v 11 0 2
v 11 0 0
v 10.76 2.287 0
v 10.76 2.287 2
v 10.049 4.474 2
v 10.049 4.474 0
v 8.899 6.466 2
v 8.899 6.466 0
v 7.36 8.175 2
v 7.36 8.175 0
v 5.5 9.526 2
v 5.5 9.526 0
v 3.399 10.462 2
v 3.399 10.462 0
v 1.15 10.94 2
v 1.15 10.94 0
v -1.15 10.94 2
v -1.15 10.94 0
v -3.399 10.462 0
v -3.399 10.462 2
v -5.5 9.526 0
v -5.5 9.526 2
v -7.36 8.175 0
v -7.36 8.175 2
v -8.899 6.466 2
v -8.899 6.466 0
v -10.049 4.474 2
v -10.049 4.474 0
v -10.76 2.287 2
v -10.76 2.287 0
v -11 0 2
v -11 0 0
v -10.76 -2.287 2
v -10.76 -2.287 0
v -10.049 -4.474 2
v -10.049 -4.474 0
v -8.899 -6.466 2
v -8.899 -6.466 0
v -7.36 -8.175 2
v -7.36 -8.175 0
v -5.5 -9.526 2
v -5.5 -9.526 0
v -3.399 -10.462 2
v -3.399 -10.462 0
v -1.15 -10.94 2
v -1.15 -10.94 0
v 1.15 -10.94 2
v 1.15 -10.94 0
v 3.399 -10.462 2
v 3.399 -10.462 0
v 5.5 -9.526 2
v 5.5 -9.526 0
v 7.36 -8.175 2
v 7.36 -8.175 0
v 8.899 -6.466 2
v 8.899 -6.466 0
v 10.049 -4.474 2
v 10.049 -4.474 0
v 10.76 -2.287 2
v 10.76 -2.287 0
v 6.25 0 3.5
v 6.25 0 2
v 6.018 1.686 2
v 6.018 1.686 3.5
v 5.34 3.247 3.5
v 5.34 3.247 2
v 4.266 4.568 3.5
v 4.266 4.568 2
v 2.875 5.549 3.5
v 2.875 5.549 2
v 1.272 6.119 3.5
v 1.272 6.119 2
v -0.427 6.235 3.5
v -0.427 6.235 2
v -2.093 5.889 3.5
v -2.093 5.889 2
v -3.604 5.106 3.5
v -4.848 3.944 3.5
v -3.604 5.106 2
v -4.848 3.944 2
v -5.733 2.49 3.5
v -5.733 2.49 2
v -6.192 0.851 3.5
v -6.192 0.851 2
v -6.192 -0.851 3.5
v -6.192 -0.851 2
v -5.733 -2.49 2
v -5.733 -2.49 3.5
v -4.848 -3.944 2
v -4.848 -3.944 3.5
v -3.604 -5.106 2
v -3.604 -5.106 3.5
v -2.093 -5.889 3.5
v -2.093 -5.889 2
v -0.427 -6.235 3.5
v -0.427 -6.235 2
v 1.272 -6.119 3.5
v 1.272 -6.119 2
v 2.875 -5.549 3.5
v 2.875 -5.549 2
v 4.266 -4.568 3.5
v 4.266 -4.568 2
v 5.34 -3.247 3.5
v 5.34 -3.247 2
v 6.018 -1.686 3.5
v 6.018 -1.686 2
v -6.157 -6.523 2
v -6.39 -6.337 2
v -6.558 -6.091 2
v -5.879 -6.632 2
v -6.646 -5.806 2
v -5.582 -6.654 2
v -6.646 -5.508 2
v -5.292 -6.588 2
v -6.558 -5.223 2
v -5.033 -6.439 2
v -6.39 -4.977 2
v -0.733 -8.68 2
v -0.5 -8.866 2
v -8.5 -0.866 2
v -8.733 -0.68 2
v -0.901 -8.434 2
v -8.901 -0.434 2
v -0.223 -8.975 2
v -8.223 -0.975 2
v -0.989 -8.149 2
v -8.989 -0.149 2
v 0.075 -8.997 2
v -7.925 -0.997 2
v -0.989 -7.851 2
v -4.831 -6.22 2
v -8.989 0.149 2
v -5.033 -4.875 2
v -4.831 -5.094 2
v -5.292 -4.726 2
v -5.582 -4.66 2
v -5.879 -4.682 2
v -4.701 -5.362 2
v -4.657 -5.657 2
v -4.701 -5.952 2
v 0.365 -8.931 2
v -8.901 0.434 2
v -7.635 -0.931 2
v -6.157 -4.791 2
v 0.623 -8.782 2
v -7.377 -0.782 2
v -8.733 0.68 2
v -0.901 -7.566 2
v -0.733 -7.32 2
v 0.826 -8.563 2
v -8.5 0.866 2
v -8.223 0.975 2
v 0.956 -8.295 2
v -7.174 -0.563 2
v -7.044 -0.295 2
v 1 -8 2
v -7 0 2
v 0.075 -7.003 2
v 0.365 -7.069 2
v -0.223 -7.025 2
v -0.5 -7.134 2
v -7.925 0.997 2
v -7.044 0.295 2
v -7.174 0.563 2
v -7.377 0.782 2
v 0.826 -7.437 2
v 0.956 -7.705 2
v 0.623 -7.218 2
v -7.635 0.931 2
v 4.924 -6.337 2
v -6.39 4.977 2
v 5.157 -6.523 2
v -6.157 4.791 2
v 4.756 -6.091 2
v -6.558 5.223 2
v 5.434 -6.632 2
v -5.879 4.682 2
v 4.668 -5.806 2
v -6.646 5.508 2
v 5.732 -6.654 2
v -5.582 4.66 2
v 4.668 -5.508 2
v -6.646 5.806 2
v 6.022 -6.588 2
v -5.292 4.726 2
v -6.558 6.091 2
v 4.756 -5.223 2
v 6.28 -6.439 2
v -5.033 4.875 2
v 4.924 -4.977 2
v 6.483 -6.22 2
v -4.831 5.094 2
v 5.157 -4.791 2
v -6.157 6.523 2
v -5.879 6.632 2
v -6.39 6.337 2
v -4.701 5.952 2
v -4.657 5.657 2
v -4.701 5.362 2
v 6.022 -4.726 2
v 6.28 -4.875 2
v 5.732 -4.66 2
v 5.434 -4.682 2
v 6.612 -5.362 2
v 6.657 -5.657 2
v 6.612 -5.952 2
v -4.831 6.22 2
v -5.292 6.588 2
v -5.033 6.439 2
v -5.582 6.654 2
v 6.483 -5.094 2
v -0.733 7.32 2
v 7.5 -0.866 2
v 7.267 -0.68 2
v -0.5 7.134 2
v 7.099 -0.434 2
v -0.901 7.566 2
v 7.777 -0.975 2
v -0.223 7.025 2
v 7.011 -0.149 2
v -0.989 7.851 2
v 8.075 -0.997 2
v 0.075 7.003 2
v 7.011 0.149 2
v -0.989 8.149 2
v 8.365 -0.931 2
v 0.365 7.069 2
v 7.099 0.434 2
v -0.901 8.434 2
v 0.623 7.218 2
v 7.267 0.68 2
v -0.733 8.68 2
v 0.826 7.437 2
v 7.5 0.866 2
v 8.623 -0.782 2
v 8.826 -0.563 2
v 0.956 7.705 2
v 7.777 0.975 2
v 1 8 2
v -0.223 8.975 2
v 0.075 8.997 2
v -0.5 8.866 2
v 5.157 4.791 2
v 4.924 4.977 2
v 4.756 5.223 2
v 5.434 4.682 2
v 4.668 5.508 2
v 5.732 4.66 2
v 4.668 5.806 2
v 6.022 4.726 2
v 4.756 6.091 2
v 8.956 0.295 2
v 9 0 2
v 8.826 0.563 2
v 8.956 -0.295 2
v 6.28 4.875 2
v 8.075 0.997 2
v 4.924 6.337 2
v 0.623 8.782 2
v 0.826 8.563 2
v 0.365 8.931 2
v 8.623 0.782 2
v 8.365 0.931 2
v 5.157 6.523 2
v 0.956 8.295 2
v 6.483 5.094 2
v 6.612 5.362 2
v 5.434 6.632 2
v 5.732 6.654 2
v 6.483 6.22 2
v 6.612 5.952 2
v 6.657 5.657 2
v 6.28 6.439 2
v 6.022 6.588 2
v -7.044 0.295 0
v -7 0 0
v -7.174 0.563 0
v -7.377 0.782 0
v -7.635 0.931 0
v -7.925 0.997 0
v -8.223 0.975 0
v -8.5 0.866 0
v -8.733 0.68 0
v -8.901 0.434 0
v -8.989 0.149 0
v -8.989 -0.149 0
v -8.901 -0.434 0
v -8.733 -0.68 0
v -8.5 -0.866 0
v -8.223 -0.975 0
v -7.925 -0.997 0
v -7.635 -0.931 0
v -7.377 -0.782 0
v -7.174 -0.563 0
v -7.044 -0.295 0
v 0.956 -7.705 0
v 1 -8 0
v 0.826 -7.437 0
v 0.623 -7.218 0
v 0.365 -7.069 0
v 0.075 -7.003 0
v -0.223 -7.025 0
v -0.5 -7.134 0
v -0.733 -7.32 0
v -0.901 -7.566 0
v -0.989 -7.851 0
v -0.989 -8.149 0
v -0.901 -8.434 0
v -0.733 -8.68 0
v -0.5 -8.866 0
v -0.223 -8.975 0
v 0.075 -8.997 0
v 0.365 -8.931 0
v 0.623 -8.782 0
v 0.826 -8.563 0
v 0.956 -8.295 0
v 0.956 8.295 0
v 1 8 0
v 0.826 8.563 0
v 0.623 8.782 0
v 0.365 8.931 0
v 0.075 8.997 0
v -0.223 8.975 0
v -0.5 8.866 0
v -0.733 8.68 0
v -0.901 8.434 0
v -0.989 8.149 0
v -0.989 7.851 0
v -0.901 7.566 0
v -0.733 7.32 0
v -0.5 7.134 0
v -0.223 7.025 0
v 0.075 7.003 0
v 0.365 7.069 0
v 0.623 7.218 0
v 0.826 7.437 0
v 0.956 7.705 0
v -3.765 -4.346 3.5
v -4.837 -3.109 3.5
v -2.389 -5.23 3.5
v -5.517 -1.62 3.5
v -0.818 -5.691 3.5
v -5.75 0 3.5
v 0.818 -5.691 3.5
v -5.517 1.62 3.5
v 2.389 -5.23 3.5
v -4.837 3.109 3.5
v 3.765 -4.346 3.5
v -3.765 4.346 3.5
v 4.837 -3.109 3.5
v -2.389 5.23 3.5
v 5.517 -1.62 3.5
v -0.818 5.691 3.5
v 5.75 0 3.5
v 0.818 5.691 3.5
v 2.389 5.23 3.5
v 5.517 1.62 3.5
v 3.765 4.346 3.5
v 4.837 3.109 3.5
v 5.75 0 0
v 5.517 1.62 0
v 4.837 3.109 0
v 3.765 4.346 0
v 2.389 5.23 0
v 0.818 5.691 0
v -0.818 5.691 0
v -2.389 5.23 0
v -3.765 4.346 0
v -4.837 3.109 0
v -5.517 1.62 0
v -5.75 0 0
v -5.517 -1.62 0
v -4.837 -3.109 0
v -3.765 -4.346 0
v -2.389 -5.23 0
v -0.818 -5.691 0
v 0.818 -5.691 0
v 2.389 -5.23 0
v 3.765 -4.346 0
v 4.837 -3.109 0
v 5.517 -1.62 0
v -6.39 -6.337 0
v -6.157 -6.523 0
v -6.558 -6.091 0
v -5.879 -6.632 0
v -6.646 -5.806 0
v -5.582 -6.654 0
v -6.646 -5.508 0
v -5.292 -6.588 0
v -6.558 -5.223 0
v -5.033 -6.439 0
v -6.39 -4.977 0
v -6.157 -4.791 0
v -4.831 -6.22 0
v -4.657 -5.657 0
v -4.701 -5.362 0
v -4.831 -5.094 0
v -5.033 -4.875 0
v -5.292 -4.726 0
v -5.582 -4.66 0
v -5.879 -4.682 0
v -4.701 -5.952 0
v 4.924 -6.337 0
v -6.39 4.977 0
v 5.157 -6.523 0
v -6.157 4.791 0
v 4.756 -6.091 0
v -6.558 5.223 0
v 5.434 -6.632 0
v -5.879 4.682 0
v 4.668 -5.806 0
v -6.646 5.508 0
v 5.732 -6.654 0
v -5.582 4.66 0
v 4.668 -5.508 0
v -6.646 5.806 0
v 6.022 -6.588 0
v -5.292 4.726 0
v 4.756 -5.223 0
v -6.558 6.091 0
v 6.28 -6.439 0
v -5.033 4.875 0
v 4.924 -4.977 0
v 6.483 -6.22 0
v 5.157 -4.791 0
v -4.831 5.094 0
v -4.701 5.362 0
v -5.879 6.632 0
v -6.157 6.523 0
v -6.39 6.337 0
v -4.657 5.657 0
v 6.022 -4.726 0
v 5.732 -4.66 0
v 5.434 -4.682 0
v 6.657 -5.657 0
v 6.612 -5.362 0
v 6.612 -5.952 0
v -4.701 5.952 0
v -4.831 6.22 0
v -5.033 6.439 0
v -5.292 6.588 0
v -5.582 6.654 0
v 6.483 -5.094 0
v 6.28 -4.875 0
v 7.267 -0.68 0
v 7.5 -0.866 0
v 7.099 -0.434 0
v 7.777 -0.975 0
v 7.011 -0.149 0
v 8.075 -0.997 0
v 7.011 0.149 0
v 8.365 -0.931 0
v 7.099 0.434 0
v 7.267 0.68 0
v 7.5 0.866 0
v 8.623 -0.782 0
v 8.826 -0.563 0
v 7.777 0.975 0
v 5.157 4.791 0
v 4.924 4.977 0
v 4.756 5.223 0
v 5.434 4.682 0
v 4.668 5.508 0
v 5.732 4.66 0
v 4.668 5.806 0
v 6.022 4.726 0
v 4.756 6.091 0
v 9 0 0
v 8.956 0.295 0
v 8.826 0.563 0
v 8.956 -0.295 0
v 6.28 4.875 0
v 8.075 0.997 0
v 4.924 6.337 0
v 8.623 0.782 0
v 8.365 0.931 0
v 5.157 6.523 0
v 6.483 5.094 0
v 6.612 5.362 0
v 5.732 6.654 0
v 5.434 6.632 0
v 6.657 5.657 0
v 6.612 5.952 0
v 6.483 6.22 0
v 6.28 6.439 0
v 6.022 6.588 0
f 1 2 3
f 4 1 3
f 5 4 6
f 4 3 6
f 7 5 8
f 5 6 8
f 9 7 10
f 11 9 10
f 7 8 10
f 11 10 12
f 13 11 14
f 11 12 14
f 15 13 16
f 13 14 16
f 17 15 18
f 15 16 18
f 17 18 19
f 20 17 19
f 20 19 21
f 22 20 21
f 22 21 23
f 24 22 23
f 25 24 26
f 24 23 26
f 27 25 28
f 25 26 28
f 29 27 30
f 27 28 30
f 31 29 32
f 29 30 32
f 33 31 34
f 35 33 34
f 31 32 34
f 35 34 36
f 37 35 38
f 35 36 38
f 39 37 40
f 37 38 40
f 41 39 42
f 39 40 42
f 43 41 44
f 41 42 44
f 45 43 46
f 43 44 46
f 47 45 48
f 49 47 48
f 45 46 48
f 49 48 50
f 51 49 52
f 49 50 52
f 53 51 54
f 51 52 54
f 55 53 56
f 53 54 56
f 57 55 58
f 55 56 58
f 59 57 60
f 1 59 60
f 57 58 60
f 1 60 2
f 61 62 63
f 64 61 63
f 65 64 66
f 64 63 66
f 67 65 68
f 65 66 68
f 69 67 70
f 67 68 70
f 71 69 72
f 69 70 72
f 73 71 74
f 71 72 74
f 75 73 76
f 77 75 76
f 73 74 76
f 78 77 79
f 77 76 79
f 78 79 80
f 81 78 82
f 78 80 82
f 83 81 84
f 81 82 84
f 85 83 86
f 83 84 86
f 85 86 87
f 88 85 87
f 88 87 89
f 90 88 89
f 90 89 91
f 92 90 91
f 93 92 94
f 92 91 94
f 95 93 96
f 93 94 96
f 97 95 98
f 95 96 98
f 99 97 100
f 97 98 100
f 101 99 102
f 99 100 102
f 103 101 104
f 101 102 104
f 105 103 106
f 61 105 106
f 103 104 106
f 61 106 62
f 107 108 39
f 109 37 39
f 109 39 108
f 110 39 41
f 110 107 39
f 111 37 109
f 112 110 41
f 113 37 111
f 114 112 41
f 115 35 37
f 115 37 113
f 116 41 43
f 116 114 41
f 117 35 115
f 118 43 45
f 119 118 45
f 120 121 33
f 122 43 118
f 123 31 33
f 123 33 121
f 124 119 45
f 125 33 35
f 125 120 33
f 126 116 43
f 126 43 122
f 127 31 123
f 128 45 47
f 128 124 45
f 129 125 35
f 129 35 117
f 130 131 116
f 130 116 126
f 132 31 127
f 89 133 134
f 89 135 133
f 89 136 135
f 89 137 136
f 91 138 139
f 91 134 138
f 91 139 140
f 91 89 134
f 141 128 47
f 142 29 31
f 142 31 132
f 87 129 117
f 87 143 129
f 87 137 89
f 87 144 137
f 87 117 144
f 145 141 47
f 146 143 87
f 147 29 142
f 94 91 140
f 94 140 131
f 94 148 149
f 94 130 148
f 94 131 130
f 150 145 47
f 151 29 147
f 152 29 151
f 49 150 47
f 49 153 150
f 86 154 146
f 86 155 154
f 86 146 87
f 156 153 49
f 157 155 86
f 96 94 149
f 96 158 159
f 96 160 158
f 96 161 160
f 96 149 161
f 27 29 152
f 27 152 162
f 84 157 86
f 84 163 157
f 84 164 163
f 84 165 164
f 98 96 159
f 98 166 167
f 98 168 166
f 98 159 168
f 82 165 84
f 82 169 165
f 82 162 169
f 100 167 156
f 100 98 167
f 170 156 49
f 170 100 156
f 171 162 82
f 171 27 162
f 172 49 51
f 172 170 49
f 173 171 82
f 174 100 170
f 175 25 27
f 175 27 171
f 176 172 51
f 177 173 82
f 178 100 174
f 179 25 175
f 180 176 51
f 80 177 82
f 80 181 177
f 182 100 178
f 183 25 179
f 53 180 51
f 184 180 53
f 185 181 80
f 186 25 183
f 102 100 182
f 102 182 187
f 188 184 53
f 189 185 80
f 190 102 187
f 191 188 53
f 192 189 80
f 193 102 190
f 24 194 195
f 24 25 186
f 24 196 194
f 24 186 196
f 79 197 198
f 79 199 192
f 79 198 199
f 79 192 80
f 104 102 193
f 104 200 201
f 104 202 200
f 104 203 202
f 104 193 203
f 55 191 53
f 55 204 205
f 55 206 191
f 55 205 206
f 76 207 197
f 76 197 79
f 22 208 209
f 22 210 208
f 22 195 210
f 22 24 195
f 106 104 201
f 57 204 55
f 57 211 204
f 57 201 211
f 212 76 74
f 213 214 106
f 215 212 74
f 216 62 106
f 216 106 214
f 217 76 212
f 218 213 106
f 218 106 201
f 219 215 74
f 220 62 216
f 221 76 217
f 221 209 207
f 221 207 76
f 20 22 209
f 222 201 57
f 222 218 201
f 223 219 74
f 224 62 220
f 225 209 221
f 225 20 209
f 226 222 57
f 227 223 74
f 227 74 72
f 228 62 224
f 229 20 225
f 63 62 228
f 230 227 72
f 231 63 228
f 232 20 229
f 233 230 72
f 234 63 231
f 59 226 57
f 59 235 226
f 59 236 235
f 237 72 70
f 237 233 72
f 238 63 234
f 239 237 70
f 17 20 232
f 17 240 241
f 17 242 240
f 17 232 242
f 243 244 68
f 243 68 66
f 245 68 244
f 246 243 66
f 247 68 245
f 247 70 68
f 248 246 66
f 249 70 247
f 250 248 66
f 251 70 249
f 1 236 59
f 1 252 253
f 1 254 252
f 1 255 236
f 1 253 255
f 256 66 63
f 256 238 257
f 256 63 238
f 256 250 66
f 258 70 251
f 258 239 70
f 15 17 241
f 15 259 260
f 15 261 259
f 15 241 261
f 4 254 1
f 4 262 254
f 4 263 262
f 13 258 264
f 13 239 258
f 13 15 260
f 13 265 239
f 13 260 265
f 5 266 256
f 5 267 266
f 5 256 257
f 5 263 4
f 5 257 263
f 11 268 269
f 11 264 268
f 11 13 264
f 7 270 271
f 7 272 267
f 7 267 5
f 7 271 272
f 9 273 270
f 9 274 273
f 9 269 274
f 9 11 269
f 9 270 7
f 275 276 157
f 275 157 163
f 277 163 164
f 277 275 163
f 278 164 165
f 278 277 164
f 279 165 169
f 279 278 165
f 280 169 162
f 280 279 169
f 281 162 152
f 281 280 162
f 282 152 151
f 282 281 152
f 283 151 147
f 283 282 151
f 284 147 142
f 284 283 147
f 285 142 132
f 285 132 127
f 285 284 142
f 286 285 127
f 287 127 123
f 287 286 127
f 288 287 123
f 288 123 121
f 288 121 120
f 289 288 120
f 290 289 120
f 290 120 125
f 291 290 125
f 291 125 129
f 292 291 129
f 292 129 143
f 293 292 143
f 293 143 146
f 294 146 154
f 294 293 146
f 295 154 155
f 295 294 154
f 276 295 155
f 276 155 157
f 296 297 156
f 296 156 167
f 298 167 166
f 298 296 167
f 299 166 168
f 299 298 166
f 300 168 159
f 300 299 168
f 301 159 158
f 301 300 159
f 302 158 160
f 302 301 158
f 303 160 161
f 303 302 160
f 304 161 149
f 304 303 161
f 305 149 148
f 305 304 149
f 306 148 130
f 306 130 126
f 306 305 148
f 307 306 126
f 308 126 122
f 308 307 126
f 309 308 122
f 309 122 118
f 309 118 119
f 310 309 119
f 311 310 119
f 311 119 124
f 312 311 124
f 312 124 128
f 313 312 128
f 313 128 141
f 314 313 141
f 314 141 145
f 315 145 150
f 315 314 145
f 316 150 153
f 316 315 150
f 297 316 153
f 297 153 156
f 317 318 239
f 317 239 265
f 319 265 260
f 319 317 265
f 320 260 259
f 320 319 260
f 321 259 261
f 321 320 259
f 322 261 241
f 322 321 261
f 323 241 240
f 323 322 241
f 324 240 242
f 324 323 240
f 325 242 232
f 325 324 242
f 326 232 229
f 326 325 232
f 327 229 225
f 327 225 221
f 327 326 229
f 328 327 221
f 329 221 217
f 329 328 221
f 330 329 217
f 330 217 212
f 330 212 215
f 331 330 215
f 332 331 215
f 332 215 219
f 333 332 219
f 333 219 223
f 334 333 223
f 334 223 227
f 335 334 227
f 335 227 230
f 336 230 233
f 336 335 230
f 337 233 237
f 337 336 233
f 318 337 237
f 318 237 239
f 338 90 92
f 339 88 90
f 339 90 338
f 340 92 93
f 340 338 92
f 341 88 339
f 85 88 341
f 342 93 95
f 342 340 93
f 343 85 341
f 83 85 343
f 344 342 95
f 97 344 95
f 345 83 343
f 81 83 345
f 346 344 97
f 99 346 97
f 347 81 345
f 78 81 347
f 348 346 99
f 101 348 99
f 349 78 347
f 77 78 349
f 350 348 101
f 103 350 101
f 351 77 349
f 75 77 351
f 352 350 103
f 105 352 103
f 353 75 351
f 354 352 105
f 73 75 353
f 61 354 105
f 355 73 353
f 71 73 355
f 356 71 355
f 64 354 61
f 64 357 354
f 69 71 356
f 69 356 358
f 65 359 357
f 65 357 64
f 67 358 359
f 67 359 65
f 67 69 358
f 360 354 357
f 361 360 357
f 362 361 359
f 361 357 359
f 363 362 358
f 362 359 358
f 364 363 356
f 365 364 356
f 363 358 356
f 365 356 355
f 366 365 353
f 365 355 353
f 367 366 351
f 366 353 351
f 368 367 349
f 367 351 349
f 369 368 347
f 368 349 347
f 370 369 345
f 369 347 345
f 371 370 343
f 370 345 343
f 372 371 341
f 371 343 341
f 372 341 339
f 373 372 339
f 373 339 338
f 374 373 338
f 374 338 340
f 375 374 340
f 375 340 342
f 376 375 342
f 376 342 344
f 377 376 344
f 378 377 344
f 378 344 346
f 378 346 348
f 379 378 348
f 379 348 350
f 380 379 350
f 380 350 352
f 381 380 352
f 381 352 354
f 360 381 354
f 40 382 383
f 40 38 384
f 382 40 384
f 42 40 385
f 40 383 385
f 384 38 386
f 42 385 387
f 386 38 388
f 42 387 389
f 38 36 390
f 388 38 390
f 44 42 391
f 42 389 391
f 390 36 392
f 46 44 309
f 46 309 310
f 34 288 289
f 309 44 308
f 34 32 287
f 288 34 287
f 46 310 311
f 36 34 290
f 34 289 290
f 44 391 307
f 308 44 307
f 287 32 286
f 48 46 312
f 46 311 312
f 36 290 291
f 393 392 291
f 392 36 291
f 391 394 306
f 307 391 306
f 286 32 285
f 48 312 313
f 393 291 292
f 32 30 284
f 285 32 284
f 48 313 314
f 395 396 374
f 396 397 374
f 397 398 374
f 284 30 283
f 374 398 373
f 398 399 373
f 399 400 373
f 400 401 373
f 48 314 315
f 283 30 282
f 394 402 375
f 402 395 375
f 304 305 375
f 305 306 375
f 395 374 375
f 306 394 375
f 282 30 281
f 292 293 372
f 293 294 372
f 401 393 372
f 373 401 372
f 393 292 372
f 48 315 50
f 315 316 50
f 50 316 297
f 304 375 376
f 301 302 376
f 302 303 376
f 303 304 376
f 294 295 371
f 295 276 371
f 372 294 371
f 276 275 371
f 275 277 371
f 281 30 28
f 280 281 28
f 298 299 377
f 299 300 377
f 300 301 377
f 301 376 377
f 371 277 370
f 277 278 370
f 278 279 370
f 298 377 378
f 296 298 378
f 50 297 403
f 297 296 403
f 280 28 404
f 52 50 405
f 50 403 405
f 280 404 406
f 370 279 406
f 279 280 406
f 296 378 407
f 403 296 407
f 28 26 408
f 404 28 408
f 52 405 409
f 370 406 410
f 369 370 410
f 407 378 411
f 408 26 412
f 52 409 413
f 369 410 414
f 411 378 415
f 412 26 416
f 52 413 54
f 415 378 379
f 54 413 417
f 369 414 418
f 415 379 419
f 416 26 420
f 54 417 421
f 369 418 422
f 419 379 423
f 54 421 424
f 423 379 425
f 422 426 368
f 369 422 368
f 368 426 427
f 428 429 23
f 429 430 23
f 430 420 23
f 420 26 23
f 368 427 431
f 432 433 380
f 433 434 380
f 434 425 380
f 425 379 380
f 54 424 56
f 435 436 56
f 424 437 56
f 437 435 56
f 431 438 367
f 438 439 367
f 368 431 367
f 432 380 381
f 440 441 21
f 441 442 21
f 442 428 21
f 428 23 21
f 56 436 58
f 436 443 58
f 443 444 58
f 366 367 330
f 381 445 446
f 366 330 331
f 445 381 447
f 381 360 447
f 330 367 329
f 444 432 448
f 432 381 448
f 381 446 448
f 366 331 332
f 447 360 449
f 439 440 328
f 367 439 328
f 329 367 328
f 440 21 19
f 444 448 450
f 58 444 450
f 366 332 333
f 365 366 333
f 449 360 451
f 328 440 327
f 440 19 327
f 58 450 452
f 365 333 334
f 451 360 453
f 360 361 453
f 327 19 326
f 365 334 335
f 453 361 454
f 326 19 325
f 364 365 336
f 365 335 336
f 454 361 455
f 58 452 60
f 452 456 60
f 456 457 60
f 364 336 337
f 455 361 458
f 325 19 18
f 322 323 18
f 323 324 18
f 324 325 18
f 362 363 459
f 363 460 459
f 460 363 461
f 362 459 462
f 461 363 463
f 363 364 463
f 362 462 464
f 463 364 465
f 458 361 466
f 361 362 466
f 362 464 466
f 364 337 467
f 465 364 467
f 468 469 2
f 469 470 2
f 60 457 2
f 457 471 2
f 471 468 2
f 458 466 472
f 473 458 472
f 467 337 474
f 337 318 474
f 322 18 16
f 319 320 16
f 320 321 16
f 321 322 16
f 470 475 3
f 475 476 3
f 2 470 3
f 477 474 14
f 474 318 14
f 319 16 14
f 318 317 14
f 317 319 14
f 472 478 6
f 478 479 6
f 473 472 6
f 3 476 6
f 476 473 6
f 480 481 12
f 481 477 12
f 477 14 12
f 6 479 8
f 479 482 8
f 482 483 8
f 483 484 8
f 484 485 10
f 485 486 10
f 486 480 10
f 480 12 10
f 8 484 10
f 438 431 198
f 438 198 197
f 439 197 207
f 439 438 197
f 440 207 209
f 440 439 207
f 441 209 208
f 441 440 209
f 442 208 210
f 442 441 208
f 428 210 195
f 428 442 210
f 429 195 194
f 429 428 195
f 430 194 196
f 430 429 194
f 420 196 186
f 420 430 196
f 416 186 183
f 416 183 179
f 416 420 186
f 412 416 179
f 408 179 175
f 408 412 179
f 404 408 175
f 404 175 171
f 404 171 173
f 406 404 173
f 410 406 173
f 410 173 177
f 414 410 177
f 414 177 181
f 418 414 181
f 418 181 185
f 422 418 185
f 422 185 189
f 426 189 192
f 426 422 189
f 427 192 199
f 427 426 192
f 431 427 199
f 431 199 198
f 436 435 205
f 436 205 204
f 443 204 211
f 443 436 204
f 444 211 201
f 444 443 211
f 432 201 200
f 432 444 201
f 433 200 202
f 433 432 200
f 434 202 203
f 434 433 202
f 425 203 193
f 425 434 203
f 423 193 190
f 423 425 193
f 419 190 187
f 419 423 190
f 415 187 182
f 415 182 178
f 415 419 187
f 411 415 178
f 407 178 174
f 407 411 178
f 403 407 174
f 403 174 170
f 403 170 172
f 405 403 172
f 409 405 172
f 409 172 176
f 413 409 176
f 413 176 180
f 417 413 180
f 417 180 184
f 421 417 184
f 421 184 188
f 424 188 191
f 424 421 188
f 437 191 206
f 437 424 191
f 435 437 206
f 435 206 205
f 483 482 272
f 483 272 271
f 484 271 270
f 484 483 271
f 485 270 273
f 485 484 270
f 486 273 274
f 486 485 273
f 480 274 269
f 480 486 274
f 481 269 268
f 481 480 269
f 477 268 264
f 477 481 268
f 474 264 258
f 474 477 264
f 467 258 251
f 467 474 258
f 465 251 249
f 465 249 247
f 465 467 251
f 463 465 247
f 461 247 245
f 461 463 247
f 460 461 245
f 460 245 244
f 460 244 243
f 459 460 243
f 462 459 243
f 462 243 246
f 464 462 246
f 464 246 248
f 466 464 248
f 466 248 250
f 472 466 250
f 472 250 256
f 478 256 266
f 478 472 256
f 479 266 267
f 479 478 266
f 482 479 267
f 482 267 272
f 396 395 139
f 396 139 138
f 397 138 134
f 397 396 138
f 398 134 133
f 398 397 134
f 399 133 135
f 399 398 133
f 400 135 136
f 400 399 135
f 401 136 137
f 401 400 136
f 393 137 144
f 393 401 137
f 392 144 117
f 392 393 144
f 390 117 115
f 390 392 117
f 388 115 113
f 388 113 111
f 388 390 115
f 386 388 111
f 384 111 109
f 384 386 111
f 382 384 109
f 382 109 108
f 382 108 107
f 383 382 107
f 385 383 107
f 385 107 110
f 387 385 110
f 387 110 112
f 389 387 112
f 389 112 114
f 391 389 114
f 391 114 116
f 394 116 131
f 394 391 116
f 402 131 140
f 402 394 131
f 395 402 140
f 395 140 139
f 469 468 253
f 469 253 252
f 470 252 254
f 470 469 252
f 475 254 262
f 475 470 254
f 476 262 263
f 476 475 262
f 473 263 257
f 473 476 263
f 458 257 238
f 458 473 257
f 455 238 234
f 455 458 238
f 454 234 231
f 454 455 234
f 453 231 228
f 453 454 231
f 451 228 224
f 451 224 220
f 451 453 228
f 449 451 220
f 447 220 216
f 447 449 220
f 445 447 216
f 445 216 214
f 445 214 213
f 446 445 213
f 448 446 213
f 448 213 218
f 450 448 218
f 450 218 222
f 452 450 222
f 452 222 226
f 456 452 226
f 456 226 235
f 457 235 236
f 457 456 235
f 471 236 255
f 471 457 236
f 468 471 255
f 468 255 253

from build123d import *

# Parameters (mm, degrees)
SKETCH1_R           = 11
SKETCH1_R_2         = 1
BOSS_EXTRUDE1_DEPTH = 2
SKETCH2_R           = 6.25
BOSS_EXTRUDE2_DEPTH = 1.5
SKETCH3_R           = 5.75
CUT_EXTRUDE1_DEPTH  = 11


with BuildPart() as part:
    # Sketch1 → Boss-Extrude1 (new body)
    with BuildSketch(Plane.XY):
        Circle(SKETCH1_R)
        with Locations((0, 8)):
            Circle(SKETCH1_R_2, mode=Mode.SUBTRACT)
        with Locations((5.656854249, 5.656854249)):
            Circle(SKETCH1_R_2, mode=Mode.SUBTRACT)
        with Locations((8, 0)):
            Circle(SKETCH1_R_2, mode=Mode.SUBTRACT)
        with Locations((5.656854249, -5.656854249)):
            Circle(SKETCH1_R_2, mode=Mode.SUBTRACT)
        with Locations((0, -8)):
            Circle(SKETCH1_R_2, mode=Mode.SUBTRACT)
        with Locations((-5.656854249, -5.656854249)):
            Circle(SKETCH1_R_2, mode=Mode.SUBTRACT)
        with Locations((-8, 0)):
            Circle(SKETCH1_R_2, mode=Mode.SUBTRACT)
        with Locations((-5.656854249, 5.656854249)):
            Circle(SKETCH1_R_2, mode=Mode.SUBTRACT)
    extrude(amount=BOSS_EXTRUDE1_DEPTH)

    # Sketch2 → Boss-Extrude2 (add)
    with BuildSketch(Plane.XY.offset(2)):
        Circle(SKETCH2_R)
    extrude(amount=BOSS_EXTRUDE2_DEPTH)

    # Sketch3 → Cut-Extrude1 (cut)
    with BuildSketch(Plane.XY.offset(3.5)):
        Circle(SKETCH3_R)
    extrude(amount=-CUT_EXTRUDE1_DEPTH, mode=Mode.SUBTRACT)


solid = part.part
